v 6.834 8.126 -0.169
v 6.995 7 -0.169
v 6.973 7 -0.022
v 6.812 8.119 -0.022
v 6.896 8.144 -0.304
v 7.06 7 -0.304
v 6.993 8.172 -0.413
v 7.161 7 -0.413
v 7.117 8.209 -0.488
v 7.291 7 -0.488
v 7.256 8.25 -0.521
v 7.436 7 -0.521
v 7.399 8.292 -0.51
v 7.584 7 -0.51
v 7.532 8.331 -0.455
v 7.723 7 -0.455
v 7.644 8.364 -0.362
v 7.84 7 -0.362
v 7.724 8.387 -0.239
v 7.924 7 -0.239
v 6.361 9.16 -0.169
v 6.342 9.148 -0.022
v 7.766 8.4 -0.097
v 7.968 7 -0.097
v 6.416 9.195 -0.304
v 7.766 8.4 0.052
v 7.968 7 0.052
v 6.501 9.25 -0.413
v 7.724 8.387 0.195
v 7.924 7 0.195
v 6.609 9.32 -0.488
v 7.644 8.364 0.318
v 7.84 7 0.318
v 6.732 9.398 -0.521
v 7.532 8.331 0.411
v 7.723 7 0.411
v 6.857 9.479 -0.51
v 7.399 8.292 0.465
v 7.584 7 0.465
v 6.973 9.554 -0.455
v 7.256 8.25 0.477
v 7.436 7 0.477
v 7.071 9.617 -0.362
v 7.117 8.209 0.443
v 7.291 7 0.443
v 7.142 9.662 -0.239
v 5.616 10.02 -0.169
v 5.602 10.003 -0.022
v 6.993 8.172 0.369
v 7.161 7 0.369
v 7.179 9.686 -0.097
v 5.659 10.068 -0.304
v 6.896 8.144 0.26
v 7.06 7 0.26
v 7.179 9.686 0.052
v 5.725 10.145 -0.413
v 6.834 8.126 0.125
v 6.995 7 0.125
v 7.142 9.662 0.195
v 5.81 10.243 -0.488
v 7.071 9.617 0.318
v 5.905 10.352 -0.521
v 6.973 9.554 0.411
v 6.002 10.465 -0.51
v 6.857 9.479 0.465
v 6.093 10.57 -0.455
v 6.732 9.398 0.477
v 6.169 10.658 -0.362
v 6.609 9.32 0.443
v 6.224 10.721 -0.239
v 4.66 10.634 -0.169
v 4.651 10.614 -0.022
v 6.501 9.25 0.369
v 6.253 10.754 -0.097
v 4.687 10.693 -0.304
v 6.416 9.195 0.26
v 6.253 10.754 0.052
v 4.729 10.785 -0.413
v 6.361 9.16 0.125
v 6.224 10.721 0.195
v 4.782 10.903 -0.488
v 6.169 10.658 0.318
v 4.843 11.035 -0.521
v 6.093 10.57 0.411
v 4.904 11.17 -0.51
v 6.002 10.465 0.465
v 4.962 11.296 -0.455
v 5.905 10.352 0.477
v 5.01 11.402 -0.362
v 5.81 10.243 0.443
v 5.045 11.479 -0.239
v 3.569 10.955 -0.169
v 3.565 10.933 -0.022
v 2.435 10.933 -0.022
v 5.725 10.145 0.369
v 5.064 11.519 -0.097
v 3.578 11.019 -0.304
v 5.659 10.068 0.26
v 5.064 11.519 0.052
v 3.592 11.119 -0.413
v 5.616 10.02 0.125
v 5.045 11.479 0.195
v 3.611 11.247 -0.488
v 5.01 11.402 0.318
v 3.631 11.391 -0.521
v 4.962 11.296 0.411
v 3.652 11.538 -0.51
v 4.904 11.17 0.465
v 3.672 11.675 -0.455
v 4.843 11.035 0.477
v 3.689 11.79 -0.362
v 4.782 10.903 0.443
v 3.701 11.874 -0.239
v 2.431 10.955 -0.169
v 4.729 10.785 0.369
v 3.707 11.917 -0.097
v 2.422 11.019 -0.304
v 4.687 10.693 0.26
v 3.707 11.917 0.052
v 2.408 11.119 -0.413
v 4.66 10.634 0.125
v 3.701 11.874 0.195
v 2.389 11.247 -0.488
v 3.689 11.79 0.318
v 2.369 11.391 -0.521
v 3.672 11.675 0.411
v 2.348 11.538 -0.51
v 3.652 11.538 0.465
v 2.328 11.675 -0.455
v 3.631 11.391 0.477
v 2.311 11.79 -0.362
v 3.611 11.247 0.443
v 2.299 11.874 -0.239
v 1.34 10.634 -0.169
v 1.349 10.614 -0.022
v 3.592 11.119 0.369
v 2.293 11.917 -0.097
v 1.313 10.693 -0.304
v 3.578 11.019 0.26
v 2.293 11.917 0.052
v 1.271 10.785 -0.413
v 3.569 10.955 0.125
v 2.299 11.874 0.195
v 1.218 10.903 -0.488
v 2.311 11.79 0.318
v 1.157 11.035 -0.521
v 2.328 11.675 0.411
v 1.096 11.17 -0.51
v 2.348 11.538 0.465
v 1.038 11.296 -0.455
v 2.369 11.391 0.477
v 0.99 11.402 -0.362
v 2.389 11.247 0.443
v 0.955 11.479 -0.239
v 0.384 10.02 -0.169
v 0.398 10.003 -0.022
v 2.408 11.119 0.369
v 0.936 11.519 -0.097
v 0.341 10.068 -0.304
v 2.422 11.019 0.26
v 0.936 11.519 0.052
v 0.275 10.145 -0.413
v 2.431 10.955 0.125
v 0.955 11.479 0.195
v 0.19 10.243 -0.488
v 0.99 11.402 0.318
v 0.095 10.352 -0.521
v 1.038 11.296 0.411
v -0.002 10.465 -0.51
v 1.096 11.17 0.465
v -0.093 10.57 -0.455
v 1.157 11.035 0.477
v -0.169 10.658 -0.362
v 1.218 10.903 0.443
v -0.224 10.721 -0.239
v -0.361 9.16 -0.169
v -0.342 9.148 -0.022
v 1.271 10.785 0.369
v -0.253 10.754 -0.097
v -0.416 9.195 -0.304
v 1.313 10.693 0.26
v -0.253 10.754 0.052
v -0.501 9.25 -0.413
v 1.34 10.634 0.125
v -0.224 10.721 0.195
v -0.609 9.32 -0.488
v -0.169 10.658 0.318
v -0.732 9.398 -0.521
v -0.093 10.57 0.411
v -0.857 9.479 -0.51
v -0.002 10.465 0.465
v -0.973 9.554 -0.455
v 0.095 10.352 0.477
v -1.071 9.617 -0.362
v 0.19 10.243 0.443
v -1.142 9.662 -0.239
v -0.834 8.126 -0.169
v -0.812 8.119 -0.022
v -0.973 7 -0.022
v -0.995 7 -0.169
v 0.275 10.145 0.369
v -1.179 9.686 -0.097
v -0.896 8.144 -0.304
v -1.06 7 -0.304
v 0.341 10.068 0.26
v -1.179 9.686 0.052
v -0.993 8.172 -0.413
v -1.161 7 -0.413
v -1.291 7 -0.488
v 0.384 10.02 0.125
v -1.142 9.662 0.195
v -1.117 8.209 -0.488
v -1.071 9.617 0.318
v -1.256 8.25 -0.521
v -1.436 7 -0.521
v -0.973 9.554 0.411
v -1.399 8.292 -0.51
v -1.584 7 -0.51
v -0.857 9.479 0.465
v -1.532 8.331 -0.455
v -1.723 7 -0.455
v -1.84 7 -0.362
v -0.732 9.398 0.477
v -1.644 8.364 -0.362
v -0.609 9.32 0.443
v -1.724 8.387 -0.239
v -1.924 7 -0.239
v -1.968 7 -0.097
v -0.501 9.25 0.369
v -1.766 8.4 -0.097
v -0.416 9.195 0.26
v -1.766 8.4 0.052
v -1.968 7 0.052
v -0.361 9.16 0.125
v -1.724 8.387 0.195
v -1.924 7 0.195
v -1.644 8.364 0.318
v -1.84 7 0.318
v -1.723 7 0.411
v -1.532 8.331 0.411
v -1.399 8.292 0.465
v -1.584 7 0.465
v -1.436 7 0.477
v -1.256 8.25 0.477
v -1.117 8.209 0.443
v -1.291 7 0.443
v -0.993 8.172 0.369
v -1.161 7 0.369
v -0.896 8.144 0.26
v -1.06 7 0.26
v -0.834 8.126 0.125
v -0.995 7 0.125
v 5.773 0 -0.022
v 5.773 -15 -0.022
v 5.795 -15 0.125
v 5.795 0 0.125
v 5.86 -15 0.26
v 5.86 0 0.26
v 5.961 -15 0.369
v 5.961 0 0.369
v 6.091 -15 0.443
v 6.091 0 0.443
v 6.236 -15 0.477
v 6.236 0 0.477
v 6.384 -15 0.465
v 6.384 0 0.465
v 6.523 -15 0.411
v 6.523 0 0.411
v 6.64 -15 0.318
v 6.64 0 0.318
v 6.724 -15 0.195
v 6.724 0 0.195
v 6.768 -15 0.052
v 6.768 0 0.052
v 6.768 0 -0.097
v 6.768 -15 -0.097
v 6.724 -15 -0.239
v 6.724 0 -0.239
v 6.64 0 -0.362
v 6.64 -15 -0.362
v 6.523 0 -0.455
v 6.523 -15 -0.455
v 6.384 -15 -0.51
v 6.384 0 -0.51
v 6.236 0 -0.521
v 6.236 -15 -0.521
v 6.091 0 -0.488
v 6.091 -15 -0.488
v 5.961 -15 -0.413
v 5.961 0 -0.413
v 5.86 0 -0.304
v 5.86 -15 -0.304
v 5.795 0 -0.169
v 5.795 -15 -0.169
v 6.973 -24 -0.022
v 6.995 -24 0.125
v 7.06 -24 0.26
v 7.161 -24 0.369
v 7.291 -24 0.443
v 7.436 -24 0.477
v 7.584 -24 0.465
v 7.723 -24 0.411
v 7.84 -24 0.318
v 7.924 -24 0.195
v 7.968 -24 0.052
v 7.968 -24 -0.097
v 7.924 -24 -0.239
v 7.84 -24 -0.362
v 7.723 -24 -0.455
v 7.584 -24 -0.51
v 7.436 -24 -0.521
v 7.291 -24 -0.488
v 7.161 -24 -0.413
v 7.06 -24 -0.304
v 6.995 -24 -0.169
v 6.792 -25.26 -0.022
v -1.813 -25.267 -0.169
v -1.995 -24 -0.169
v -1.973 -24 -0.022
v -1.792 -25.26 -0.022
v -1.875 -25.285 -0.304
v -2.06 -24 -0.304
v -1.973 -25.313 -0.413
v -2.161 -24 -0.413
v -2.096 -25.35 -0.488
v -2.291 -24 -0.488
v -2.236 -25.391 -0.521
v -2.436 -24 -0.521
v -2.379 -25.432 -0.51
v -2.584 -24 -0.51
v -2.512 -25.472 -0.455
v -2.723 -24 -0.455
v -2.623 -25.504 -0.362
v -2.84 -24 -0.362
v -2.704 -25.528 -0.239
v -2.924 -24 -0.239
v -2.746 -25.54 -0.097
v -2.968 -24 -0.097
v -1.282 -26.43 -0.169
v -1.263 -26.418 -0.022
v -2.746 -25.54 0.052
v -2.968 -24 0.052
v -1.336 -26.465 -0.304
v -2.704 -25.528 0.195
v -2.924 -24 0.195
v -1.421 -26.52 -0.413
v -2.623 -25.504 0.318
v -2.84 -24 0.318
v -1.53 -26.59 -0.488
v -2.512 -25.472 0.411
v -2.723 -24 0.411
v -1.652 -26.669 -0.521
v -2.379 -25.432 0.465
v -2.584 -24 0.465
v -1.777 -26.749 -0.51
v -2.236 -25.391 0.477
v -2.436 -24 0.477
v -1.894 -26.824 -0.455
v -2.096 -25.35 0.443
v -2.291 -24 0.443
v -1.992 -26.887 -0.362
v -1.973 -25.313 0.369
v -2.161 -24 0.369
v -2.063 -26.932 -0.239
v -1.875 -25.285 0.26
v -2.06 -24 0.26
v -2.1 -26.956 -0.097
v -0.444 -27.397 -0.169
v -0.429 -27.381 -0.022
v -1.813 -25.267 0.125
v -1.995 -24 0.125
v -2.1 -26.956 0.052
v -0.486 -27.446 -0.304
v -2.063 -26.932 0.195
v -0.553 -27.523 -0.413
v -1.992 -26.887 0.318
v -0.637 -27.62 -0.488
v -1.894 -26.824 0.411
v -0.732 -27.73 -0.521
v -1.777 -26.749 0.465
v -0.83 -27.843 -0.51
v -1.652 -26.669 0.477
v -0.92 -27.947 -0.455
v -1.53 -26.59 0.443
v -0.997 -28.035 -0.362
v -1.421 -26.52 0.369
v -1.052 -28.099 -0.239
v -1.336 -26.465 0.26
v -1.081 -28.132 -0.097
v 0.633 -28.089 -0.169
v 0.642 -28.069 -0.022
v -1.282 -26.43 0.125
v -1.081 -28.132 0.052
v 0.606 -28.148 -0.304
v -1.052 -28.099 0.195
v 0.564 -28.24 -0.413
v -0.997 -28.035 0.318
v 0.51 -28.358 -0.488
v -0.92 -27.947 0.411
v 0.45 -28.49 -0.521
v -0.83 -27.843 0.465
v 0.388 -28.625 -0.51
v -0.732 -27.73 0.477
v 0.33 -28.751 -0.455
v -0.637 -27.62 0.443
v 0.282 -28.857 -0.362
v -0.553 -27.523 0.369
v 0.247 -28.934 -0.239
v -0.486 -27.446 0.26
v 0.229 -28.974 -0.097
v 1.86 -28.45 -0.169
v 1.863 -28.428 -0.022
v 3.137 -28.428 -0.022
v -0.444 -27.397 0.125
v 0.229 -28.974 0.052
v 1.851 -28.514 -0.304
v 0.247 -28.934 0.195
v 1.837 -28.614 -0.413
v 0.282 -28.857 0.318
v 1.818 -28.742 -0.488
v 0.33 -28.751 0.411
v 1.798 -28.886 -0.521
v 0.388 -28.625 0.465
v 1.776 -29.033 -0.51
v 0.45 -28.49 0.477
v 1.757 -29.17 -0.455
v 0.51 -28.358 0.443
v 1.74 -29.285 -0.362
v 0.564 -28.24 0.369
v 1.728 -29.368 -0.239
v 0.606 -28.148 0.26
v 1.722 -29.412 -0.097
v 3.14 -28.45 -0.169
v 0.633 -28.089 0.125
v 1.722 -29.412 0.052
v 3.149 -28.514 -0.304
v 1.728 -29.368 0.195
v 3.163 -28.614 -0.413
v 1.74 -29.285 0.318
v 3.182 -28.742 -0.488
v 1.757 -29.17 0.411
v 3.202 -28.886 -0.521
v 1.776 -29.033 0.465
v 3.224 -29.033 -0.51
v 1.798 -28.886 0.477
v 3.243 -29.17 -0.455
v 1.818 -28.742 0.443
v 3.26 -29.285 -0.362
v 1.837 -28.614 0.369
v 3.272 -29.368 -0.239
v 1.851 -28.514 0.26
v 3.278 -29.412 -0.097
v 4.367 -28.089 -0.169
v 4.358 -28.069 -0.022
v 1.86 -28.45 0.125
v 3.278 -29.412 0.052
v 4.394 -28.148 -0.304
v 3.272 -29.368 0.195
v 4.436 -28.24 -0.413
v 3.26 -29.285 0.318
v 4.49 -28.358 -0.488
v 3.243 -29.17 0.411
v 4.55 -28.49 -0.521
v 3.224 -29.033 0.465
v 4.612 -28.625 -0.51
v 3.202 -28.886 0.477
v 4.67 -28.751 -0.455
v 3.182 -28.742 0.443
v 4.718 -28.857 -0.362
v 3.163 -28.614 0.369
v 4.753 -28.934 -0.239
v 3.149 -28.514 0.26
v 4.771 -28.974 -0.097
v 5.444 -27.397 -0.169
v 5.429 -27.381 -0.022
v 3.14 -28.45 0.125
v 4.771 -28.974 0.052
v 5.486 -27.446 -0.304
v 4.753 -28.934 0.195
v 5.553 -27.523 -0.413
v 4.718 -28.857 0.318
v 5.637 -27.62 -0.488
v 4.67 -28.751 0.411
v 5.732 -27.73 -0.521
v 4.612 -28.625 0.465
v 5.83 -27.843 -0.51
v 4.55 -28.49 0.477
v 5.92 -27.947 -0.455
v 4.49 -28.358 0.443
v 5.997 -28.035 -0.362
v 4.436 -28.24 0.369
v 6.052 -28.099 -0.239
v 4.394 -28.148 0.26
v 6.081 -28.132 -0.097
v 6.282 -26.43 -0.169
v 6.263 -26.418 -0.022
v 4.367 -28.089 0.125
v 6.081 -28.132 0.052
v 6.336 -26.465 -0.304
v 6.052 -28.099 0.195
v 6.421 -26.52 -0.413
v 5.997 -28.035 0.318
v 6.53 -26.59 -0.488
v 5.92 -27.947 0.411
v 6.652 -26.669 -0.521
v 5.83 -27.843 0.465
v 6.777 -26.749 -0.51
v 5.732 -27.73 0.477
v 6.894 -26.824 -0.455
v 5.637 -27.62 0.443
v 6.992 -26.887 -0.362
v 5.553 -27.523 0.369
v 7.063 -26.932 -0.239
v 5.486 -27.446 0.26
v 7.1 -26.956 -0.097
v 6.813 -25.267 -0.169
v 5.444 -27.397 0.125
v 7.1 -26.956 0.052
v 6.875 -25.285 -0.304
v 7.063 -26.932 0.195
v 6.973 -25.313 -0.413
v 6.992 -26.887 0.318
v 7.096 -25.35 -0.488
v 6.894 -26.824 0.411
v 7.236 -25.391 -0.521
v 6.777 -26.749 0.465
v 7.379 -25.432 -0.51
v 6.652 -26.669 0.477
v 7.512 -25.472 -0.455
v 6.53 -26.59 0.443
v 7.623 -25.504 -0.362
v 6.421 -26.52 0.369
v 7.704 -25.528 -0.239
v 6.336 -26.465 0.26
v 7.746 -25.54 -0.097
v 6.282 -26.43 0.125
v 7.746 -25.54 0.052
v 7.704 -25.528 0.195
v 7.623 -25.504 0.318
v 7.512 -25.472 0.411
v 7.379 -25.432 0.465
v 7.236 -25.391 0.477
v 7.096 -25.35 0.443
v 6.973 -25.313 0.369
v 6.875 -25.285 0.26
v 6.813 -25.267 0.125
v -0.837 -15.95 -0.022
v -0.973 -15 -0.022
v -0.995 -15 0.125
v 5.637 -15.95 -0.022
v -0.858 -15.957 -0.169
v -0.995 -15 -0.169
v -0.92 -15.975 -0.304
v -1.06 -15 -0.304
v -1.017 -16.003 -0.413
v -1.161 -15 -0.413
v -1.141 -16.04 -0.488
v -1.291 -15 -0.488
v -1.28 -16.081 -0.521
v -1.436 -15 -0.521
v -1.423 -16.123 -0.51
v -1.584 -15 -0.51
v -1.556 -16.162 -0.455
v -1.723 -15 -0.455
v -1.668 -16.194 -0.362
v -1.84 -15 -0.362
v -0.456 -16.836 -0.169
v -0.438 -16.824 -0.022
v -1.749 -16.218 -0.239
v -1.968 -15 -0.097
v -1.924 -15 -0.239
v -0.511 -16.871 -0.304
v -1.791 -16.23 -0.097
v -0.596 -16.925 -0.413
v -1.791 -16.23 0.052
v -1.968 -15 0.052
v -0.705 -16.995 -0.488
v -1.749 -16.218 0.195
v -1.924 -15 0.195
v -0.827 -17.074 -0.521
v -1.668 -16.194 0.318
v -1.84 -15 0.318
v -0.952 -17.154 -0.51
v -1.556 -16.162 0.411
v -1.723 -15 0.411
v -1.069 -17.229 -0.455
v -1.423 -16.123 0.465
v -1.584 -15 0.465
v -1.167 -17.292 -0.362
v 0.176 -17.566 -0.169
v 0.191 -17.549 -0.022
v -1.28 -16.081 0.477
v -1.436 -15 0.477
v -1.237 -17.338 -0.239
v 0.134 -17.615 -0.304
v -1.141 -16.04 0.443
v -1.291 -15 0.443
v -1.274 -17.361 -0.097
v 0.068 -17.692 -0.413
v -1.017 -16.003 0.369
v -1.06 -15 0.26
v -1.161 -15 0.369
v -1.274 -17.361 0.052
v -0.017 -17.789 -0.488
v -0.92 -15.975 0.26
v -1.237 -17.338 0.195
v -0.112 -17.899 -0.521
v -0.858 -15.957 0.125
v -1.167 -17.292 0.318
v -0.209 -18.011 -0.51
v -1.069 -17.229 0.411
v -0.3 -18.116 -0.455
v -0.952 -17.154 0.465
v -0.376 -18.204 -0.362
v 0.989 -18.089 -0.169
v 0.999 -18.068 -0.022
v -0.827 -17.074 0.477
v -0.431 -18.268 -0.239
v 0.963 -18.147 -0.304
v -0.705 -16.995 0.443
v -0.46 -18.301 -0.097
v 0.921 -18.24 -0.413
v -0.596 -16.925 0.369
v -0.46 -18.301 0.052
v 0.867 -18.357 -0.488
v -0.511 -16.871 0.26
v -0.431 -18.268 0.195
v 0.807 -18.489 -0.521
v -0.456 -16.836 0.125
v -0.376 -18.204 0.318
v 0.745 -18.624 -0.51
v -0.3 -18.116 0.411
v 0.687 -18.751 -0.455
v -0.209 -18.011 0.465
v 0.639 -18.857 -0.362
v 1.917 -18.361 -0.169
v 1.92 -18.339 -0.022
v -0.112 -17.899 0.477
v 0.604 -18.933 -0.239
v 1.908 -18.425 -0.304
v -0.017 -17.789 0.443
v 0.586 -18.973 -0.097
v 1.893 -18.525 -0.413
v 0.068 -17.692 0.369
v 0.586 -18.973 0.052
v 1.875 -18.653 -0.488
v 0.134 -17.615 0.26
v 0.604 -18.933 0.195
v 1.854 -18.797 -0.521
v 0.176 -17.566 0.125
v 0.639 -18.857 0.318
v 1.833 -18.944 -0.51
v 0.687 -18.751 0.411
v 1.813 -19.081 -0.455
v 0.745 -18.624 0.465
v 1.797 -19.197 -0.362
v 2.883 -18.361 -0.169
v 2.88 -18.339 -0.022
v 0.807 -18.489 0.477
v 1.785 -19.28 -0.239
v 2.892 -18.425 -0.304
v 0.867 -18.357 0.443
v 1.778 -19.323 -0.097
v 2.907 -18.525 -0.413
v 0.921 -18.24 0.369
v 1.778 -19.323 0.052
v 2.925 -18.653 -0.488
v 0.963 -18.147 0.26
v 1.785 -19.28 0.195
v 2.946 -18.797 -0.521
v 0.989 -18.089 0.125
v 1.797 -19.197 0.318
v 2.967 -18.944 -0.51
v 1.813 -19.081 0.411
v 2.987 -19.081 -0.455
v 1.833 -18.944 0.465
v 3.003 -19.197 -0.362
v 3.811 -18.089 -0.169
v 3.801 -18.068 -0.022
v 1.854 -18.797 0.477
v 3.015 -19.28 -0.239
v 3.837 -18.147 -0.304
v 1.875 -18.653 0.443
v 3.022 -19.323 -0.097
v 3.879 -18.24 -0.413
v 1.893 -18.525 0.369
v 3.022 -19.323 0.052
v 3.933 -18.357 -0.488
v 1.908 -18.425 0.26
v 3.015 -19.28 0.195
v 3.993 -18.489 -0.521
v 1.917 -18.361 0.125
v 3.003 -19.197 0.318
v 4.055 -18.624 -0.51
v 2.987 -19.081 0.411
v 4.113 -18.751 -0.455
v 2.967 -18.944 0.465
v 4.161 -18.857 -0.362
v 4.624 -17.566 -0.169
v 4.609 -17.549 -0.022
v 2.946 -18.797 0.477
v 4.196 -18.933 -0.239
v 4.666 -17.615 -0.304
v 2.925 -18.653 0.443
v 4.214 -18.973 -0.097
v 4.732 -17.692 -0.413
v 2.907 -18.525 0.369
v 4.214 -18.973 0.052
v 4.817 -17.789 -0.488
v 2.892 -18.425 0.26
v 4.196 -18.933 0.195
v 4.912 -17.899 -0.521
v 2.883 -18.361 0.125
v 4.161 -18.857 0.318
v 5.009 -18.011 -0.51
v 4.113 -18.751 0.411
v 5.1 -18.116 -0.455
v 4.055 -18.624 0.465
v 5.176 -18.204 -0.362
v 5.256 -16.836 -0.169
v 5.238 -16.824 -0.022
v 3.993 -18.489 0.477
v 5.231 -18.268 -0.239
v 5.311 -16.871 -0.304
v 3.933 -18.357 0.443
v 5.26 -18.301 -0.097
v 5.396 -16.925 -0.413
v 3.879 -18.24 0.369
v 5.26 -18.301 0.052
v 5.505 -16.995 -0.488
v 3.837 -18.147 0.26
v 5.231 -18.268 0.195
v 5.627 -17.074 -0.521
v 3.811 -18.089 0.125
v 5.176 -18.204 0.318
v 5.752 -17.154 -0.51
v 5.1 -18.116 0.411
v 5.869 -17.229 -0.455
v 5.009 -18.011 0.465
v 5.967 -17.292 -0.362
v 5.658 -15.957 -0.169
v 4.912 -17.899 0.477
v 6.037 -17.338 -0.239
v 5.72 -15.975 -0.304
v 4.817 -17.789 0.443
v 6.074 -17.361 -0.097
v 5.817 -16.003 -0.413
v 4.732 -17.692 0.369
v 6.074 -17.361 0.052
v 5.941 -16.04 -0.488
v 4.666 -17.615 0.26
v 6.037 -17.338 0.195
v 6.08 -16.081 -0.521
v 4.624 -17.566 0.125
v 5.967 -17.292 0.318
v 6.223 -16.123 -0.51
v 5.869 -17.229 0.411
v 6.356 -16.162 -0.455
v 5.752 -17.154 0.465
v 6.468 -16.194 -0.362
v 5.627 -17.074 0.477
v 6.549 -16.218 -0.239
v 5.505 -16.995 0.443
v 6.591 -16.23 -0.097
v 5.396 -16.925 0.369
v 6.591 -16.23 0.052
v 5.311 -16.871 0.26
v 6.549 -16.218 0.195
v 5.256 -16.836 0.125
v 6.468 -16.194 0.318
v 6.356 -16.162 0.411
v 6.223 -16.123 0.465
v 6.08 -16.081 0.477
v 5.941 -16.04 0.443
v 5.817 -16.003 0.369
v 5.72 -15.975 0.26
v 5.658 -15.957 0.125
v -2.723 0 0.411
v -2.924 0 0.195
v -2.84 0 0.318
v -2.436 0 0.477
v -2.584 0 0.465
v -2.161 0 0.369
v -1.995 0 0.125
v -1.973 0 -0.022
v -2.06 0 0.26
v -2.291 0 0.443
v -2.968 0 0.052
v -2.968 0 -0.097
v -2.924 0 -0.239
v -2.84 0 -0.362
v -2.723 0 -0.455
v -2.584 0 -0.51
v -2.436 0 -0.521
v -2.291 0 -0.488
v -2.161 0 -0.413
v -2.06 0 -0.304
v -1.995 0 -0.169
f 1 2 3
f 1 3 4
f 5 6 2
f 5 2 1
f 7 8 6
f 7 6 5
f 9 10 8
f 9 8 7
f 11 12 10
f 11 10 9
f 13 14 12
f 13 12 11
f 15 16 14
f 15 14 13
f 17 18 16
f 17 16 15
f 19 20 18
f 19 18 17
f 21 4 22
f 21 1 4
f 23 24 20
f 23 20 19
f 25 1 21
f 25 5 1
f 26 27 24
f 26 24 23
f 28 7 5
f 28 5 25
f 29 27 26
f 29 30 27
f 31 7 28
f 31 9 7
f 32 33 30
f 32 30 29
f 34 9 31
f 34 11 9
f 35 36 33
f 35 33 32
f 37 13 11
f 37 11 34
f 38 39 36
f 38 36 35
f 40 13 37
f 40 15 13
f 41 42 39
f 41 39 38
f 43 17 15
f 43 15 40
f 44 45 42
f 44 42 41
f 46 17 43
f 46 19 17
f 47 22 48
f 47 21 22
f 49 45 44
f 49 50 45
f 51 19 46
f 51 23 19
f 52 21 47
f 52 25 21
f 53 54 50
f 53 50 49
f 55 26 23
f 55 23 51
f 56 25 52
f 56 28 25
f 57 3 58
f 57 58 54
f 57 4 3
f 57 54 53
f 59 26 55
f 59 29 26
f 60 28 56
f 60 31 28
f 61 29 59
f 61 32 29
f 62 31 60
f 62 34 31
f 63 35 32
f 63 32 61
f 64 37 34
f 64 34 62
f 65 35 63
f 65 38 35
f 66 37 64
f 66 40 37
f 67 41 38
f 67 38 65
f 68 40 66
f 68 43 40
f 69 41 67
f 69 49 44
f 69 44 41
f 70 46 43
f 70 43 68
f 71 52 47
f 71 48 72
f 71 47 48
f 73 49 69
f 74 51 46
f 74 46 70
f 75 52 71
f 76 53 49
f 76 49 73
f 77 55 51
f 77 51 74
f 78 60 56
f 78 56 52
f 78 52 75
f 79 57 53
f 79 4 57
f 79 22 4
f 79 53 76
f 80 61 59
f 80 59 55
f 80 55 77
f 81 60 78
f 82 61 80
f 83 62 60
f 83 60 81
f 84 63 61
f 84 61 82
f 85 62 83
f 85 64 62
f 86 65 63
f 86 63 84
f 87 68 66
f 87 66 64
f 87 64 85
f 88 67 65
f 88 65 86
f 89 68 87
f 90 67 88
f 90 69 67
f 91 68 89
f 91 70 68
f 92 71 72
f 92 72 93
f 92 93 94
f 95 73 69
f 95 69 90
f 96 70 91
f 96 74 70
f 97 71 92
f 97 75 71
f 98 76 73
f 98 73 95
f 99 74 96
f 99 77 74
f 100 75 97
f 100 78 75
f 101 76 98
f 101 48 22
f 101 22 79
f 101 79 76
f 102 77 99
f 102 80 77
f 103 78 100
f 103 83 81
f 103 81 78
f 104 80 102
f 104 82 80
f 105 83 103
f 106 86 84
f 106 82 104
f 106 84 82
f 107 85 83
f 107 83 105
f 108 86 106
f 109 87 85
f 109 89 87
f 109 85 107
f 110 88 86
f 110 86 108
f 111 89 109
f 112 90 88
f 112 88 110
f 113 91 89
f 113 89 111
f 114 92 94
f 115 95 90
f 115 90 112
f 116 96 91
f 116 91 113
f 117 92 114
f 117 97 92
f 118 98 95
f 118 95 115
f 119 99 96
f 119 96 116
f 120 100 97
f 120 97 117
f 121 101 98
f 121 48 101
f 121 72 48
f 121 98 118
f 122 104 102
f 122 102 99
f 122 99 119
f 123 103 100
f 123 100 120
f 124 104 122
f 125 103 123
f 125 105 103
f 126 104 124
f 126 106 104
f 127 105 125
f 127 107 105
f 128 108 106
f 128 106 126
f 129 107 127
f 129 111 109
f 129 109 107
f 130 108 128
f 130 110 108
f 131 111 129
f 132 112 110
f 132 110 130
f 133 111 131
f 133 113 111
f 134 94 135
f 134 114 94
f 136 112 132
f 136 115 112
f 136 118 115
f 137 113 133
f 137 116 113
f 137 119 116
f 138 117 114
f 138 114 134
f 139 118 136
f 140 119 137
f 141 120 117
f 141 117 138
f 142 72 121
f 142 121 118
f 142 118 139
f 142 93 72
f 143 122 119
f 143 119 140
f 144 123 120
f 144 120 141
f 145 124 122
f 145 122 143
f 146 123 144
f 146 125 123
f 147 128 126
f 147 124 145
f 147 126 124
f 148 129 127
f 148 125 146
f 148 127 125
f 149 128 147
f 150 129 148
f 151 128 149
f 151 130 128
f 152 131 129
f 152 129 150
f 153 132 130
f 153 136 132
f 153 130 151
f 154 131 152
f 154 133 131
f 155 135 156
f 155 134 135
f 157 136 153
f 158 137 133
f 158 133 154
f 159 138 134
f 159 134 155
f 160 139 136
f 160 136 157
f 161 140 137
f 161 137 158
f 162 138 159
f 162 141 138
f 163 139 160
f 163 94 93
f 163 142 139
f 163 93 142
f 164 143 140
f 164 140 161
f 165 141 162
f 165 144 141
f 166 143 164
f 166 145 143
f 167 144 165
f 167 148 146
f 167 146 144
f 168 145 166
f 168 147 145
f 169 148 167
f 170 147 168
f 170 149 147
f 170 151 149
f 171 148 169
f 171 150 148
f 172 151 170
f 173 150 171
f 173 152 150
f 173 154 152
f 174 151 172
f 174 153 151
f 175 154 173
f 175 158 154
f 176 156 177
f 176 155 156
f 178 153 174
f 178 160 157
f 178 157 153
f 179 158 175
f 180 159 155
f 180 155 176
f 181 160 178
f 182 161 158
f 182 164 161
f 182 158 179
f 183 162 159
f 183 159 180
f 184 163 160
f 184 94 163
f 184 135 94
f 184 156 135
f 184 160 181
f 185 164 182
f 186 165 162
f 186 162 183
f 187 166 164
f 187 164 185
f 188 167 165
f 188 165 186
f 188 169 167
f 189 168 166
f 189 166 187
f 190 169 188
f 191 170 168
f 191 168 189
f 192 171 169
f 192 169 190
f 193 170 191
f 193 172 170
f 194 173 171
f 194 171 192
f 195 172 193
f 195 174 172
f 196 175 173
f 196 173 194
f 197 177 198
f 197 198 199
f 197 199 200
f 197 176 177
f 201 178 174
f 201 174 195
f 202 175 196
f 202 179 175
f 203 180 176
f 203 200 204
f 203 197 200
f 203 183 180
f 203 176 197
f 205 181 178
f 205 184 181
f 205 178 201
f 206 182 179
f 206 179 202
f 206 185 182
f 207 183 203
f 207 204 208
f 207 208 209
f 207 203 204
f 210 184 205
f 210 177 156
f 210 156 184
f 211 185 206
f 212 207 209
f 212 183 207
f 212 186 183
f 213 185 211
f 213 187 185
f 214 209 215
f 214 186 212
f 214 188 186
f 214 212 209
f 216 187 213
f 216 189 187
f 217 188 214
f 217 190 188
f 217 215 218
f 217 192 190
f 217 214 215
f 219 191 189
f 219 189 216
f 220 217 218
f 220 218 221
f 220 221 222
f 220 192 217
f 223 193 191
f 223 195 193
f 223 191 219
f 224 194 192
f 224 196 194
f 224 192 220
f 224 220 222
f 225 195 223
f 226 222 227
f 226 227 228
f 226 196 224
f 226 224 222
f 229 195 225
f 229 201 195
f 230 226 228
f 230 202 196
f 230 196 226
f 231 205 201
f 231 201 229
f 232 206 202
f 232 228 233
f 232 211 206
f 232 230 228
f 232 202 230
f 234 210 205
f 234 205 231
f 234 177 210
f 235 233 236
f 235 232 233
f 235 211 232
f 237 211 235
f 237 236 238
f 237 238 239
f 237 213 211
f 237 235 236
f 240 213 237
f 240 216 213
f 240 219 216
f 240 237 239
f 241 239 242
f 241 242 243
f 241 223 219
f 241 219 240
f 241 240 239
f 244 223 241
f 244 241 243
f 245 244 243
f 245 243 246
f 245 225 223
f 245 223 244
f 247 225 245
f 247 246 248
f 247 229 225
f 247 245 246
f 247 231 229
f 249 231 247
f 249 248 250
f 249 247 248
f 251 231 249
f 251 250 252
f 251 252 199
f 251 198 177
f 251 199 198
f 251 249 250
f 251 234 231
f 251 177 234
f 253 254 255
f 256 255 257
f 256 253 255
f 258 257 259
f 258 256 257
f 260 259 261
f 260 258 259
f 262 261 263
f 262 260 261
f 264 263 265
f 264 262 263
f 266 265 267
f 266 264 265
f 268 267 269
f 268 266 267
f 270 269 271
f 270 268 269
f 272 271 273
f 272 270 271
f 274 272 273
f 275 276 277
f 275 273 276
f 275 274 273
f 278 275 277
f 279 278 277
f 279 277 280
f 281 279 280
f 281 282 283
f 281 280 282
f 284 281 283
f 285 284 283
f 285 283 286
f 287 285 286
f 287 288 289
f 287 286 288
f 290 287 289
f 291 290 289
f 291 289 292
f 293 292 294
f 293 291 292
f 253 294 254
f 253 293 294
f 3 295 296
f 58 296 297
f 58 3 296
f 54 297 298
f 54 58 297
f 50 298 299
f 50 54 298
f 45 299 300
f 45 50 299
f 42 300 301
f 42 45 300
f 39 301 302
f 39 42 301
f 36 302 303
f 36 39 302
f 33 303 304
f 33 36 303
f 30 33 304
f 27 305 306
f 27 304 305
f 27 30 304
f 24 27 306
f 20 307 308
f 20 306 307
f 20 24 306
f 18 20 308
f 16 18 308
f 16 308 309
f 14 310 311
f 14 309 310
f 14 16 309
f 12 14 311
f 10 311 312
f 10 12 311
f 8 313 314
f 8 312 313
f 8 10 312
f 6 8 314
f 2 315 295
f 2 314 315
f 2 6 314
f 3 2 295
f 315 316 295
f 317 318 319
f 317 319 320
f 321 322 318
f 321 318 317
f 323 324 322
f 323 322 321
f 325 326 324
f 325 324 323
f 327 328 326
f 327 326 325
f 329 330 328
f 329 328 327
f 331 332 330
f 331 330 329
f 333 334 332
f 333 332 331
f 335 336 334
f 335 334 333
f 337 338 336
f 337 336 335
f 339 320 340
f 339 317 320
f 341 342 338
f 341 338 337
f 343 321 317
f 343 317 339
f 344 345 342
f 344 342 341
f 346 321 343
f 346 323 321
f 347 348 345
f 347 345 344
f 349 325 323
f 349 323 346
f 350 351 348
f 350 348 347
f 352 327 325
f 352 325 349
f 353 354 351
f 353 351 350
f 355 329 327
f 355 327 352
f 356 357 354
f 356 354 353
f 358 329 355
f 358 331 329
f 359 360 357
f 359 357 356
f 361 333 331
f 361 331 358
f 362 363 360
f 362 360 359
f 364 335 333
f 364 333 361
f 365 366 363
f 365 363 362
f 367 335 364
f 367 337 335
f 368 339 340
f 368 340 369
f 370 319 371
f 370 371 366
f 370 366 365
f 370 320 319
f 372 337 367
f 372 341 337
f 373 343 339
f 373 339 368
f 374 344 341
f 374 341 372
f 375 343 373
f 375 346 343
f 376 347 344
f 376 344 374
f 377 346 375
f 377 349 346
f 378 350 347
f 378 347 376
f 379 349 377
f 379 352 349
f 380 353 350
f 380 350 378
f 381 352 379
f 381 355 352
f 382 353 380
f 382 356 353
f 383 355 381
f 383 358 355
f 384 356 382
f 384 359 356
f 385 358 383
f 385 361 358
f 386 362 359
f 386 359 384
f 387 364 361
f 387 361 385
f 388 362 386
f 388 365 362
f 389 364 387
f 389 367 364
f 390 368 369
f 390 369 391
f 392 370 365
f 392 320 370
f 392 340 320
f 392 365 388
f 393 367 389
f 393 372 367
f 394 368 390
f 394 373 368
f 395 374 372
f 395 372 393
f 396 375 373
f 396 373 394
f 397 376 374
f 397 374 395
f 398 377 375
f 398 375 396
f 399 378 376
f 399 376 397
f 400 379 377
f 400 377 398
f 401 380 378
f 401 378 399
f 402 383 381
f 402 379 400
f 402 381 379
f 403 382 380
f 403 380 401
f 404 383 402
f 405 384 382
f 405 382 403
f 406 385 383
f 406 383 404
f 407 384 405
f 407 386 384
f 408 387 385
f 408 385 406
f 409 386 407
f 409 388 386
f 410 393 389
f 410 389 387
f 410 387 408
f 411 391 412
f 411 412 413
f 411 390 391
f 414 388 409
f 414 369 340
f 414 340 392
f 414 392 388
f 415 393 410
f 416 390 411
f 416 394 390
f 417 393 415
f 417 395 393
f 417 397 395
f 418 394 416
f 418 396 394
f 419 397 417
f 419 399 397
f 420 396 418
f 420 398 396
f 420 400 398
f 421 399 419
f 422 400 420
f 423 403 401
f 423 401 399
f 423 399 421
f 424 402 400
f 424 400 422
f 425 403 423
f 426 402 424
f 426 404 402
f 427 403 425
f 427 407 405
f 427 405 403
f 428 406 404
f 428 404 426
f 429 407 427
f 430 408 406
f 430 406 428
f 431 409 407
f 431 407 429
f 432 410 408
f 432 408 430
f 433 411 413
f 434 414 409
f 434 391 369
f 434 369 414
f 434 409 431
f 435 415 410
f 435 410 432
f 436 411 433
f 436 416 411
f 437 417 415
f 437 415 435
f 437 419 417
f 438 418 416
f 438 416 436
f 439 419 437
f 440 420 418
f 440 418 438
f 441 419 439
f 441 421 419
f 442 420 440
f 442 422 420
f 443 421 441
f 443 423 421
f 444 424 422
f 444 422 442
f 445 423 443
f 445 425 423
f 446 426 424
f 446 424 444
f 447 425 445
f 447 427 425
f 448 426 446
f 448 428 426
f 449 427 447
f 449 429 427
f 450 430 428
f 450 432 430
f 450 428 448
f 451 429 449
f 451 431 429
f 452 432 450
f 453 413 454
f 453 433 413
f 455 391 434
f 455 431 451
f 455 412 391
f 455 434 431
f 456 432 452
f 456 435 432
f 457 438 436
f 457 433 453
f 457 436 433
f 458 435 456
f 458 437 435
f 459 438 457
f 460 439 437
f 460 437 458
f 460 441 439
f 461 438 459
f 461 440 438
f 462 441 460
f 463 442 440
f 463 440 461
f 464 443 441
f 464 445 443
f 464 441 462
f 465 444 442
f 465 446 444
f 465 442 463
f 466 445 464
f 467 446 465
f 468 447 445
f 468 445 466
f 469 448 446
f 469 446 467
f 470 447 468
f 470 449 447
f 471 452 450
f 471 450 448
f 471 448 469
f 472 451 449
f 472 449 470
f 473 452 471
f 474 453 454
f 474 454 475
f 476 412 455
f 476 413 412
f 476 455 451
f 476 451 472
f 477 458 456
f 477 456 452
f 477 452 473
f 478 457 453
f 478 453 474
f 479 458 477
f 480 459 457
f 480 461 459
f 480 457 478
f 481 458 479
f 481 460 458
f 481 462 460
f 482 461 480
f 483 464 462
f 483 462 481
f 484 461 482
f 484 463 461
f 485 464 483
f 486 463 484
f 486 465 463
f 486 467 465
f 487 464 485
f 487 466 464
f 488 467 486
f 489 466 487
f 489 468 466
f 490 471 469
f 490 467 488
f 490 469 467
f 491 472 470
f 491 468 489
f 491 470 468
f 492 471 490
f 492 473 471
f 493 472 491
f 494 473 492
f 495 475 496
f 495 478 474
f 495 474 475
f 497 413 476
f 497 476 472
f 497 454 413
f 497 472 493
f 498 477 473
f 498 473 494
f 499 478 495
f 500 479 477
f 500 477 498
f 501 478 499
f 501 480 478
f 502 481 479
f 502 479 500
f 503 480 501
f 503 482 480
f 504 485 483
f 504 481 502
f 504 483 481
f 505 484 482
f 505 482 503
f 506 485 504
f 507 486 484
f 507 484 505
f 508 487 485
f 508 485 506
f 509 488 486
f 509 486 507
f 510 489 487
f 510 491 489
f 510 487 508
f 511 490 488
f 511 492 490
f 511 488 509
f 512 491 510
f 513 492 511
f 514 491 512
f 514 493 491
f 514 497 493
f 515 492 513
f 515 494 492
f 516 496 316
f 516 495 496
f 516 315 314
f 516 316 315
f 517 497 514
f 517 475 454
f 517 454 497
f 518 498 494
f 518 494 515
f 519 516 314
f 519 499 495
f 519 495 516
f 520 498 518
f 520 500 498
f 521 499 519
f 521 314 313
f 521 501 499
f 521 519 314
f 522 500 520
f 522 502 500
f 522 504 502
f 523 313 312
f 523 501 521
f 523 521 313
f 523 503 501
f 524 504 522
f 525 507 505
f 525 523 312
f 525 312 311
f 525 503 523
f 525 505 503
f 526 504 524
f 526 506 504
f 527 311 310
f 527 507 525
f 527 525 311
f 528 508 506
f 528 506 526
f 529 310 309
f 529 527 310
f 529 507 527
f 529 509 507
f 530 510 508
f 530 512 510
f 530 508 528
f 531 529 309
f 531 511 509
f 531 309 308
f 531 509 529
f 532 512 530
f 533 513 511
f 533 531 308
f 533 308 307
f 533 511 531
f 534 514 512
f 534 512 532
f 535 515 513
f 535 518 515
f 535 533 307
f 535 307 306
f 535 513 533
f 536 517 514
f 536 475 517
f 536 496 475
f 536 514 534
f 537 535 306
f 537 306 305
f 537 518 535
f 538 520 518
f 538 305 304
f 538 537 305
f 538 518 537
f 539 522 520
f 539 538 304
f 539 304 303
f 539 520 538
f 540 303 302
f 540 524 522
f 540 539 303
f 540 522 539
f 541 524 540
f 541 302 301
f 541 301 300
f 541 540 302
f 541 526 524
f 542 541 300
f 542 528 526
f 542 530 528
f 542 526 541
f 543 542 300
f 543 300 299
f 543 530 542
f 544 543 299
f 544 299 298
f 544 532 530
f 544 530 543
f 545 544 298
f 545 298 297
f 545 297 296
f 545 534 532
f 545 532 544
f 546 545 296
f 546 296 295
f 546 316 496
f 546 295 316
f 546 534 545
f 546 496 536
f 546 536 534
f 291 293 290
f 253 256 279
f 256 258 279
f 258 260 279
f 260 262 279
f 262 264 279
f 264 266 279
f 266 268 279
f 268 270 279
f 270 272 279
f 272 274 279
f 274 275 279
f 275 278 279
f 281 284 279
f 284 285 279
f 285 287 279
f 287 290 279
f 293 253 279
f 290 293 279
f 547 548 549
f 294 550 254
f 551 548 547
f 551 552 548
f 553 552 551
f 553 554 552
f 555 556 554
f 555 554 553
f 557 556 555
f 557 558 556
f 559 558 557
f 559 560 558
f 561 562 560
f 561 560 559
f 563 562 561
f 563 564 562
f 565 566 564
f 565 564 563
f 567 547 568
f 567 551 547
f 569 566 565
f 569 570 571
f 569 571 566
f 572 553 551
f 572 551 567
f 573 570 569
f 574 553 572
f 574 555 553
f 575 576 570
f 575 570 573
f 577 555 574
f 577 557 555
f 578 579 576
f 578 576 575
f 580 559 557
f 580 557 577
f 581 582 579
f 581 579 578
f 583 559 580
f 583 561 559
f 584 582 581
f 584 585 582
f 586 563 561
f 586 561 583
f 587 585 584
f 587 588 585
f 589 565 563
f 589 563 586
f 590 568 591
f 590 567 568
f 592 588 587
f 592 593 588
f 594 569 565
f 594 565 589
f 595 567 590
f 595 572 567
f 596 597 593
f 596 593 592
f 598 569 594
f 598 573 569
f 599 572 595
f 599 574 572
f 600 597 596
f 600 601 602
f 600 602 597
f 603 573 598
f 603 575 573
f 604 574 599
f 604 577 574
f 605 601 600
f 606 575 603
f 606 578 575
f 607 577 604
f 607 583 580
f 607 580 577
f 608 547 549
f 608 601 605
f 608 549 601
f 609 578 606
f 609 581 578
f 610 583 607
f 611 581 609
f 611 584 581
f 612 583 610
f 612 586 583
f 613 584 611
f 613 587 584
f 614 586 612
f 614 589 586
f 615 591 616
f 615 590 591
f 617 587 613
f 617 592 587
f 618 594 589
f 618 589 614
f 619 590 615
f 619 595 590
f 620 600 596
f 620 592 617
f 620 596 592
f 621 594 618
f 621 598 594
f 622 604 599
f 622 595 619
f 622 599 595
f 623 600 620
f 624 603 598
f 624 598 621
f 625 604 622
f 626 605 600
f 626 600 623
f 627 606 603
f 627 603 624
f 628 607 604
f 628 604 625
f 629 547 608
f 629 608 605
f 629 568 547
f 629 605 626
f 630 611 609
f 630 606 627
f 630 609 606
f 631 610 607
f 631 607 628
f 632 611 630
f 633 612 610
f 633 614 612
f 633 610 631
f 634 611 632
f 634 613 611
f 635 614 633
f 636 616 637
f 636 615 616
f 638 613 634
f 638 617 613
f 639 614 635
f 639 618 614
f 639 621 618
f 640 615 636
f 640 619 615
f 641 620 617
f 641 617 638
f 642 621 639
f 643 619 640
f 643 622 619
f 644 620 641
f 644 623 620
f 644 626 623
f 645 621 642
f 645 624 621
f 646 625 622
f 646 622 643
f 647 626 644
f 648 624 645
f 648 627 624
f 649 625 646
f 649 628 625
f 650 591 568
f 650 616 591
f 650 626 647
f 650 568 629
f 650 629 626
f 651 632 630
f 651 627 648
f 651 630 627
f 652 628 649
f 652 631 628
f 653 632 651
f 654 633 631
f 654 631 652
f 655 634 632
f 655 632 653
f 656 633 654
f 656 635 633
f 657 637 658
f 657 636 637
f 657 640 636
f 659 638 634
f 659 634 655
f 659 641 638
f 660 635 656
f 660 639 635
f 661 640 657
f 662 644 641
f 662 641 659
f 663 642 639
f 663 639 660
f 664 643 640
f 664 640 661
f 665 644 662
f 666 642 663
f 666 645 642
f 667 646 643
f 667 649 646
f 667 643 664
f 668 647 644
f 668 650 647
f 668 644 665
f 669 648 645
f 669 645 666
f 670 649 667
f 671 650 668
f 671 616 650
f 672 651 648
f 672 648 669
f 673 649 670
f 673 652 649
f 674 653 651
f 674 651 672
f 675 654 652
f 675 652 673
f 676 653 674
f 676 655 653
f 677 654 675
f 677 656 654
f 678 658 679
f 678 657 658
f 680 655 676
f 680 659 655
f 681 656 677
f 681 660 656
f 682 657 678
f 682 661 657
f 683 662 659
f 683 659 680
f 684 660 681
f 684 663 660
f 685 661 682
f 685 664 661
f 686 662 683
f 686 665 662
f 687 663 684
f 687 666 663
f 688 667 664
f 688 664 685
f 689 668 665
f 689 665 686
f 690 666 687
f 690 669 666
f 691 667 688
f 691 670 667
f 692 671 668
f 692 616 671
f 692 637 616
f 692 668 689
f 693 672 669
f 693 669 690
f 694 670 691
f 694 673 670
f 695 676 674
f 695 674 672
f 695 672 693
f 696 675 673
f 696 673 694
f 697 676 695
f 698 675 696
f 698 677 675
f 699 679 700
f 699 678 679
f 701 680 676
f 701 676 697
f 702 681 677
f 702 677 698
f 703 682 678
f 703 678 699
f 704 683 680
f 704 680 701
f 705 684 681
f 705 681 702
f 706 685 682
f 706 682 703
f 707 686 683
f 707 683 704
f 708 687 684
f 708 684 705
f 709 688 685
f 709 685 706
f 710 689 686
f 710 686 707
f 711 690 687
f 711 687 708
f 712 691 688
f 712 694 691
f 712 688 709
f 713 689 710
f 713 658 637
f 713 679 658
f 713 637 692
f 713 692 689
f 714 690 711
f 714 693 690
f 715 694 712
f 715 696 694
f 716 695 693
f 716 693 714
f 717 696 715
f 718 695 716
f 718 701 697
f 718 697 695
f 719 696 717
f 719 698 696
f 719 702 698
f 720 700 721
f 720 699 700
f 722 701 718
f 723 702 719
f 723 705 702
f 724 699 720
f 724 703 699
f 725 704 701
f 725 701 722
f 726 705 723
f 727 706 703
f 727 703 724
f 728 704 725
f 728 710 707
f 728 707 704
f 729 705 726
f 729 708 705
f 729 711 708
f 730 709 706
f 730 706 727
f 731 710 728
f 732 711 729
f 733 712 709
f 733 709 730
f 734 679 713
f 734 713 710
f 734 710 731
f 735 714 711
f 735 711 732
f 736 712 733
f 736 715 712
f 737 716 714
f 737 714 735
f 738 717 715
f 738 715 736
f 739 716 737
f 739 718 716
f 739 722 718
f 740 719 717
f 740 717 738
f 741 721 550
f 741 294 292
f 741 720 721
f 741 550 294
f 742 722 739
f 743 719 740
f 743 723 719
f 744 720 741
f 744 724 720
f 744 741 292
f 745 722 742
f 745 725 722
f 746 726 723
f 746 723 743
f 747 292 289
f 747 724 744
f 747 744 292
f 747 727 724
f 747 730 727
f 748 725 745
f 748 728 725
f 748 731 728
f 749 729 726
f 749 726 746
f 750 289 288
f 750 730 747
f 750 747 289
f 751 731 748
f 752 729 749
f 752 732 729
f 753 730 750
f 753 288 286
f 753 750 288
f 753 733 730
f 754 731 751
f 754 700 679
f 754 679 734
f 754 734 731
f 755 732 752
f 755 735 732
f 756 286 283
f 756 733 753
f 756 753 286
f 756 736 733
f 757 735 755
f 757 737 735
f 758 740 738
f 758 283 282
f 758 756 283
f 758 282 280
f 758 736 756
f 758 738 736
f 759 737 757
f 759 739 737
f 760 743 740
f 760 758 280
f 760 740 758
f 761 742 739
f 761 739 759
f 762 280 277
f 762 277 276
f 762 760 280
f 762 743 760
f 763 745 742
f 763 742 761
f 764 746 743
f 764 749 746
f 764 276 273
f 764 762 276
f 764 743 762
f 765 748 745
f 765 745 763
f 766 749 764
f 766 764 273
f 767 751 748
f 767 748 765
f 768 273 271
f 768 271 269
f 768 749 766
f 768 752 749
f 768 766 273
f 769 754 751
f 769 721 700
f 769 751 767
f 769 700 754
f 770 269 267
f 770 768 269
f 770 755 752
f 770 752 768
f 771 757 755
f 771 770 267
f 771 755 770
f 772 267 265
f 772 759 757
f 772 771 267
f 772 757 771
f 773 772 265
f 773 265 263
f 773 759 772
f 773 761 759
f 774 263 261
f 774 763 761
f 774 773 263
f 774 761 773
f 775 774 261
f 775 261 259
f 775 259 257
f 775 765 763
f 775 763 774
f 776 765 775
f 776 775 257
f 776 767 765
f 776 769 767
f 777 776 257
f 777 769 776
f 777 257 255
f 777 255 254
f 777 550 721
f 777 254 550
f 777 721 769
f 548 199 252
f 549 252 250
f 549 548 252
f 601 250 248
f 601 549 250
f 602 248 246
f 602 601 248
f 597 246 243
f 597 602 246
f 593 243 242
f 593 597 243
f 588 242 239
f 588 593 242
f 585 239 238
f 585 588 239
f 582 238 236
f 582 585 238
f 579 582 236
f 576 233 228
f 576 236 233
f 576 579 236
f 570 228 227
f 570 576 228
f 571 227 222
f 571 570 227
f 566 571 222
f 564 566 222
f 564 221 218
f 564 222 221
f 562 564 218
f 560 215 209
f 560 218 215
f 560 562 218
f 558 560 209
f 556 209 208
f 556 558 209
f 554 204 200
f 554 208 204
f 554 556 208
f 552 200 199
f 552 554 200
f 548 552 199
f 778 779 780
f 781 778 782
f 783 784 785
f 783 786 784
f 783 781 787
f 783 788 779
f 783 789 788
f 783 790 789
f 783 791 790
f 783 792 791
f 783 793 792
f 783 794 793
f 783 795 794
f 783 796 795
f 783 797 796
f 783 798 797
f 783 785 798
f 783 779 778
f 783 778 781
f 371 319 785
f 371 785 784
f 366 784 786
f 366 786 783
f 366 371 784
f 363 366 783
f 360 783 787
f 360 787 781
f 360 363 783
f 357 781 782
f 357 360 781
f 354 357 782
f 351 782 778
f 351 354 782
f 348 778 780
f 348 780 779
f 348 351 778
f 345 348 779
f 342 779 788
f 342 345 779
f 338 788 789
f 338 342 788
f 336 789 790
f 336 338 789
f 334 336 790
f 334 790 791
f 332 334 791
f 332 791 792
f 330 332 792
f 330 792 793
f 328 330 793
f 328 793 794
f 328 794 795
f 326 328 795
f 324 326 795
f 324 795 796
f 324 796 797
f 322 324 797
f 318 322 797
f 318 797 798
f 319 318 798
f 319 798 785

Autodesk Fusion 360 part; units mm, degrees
sketch "Sketch3" plane through (0, 0, 0) normal (0, 0, 1) x (1, 0, 0)
  line L0 (-2.5, 0) -> (-2.5, -24)
  arc A0 (-2.5, -24) -> (7.5, -24) centre (2.5, -24) ccw
  line L1 (7.5, -24) -> (7.5, 7)
  arc A1 (7.5, 7) -> (-1.5, 7) centre (3, 7) ccw
  line L2 (-1.5, 7) -> (-1.5, -15)
  arc A2 (-1.5, -15) -> (6.3, -15) centre (2.4, -15) ccw
  line L3 (6.3, -15) -> (6.3, 0)
  dimension "d21" = 24
  dimension "d22" = 5
  dimension "d23" = 31
  dimension "d24" = 4.5
  dimension "d25" = 22
  dimension "d26" = 3.9
  dimension "d27" = 15
sketch "Sketch4" plane through (0, 0, 0) normal (0, 1, 0) x (1, 0, 0)
  circle A0 centre (-2.4732, 0.0221) radius 0.5
  dimension "d28" = 1
sweep "Sweep1" add profiles "Sketch4" path "Sketch3" along L0 A0 L1 A1 L2 A2 L3 section 1
